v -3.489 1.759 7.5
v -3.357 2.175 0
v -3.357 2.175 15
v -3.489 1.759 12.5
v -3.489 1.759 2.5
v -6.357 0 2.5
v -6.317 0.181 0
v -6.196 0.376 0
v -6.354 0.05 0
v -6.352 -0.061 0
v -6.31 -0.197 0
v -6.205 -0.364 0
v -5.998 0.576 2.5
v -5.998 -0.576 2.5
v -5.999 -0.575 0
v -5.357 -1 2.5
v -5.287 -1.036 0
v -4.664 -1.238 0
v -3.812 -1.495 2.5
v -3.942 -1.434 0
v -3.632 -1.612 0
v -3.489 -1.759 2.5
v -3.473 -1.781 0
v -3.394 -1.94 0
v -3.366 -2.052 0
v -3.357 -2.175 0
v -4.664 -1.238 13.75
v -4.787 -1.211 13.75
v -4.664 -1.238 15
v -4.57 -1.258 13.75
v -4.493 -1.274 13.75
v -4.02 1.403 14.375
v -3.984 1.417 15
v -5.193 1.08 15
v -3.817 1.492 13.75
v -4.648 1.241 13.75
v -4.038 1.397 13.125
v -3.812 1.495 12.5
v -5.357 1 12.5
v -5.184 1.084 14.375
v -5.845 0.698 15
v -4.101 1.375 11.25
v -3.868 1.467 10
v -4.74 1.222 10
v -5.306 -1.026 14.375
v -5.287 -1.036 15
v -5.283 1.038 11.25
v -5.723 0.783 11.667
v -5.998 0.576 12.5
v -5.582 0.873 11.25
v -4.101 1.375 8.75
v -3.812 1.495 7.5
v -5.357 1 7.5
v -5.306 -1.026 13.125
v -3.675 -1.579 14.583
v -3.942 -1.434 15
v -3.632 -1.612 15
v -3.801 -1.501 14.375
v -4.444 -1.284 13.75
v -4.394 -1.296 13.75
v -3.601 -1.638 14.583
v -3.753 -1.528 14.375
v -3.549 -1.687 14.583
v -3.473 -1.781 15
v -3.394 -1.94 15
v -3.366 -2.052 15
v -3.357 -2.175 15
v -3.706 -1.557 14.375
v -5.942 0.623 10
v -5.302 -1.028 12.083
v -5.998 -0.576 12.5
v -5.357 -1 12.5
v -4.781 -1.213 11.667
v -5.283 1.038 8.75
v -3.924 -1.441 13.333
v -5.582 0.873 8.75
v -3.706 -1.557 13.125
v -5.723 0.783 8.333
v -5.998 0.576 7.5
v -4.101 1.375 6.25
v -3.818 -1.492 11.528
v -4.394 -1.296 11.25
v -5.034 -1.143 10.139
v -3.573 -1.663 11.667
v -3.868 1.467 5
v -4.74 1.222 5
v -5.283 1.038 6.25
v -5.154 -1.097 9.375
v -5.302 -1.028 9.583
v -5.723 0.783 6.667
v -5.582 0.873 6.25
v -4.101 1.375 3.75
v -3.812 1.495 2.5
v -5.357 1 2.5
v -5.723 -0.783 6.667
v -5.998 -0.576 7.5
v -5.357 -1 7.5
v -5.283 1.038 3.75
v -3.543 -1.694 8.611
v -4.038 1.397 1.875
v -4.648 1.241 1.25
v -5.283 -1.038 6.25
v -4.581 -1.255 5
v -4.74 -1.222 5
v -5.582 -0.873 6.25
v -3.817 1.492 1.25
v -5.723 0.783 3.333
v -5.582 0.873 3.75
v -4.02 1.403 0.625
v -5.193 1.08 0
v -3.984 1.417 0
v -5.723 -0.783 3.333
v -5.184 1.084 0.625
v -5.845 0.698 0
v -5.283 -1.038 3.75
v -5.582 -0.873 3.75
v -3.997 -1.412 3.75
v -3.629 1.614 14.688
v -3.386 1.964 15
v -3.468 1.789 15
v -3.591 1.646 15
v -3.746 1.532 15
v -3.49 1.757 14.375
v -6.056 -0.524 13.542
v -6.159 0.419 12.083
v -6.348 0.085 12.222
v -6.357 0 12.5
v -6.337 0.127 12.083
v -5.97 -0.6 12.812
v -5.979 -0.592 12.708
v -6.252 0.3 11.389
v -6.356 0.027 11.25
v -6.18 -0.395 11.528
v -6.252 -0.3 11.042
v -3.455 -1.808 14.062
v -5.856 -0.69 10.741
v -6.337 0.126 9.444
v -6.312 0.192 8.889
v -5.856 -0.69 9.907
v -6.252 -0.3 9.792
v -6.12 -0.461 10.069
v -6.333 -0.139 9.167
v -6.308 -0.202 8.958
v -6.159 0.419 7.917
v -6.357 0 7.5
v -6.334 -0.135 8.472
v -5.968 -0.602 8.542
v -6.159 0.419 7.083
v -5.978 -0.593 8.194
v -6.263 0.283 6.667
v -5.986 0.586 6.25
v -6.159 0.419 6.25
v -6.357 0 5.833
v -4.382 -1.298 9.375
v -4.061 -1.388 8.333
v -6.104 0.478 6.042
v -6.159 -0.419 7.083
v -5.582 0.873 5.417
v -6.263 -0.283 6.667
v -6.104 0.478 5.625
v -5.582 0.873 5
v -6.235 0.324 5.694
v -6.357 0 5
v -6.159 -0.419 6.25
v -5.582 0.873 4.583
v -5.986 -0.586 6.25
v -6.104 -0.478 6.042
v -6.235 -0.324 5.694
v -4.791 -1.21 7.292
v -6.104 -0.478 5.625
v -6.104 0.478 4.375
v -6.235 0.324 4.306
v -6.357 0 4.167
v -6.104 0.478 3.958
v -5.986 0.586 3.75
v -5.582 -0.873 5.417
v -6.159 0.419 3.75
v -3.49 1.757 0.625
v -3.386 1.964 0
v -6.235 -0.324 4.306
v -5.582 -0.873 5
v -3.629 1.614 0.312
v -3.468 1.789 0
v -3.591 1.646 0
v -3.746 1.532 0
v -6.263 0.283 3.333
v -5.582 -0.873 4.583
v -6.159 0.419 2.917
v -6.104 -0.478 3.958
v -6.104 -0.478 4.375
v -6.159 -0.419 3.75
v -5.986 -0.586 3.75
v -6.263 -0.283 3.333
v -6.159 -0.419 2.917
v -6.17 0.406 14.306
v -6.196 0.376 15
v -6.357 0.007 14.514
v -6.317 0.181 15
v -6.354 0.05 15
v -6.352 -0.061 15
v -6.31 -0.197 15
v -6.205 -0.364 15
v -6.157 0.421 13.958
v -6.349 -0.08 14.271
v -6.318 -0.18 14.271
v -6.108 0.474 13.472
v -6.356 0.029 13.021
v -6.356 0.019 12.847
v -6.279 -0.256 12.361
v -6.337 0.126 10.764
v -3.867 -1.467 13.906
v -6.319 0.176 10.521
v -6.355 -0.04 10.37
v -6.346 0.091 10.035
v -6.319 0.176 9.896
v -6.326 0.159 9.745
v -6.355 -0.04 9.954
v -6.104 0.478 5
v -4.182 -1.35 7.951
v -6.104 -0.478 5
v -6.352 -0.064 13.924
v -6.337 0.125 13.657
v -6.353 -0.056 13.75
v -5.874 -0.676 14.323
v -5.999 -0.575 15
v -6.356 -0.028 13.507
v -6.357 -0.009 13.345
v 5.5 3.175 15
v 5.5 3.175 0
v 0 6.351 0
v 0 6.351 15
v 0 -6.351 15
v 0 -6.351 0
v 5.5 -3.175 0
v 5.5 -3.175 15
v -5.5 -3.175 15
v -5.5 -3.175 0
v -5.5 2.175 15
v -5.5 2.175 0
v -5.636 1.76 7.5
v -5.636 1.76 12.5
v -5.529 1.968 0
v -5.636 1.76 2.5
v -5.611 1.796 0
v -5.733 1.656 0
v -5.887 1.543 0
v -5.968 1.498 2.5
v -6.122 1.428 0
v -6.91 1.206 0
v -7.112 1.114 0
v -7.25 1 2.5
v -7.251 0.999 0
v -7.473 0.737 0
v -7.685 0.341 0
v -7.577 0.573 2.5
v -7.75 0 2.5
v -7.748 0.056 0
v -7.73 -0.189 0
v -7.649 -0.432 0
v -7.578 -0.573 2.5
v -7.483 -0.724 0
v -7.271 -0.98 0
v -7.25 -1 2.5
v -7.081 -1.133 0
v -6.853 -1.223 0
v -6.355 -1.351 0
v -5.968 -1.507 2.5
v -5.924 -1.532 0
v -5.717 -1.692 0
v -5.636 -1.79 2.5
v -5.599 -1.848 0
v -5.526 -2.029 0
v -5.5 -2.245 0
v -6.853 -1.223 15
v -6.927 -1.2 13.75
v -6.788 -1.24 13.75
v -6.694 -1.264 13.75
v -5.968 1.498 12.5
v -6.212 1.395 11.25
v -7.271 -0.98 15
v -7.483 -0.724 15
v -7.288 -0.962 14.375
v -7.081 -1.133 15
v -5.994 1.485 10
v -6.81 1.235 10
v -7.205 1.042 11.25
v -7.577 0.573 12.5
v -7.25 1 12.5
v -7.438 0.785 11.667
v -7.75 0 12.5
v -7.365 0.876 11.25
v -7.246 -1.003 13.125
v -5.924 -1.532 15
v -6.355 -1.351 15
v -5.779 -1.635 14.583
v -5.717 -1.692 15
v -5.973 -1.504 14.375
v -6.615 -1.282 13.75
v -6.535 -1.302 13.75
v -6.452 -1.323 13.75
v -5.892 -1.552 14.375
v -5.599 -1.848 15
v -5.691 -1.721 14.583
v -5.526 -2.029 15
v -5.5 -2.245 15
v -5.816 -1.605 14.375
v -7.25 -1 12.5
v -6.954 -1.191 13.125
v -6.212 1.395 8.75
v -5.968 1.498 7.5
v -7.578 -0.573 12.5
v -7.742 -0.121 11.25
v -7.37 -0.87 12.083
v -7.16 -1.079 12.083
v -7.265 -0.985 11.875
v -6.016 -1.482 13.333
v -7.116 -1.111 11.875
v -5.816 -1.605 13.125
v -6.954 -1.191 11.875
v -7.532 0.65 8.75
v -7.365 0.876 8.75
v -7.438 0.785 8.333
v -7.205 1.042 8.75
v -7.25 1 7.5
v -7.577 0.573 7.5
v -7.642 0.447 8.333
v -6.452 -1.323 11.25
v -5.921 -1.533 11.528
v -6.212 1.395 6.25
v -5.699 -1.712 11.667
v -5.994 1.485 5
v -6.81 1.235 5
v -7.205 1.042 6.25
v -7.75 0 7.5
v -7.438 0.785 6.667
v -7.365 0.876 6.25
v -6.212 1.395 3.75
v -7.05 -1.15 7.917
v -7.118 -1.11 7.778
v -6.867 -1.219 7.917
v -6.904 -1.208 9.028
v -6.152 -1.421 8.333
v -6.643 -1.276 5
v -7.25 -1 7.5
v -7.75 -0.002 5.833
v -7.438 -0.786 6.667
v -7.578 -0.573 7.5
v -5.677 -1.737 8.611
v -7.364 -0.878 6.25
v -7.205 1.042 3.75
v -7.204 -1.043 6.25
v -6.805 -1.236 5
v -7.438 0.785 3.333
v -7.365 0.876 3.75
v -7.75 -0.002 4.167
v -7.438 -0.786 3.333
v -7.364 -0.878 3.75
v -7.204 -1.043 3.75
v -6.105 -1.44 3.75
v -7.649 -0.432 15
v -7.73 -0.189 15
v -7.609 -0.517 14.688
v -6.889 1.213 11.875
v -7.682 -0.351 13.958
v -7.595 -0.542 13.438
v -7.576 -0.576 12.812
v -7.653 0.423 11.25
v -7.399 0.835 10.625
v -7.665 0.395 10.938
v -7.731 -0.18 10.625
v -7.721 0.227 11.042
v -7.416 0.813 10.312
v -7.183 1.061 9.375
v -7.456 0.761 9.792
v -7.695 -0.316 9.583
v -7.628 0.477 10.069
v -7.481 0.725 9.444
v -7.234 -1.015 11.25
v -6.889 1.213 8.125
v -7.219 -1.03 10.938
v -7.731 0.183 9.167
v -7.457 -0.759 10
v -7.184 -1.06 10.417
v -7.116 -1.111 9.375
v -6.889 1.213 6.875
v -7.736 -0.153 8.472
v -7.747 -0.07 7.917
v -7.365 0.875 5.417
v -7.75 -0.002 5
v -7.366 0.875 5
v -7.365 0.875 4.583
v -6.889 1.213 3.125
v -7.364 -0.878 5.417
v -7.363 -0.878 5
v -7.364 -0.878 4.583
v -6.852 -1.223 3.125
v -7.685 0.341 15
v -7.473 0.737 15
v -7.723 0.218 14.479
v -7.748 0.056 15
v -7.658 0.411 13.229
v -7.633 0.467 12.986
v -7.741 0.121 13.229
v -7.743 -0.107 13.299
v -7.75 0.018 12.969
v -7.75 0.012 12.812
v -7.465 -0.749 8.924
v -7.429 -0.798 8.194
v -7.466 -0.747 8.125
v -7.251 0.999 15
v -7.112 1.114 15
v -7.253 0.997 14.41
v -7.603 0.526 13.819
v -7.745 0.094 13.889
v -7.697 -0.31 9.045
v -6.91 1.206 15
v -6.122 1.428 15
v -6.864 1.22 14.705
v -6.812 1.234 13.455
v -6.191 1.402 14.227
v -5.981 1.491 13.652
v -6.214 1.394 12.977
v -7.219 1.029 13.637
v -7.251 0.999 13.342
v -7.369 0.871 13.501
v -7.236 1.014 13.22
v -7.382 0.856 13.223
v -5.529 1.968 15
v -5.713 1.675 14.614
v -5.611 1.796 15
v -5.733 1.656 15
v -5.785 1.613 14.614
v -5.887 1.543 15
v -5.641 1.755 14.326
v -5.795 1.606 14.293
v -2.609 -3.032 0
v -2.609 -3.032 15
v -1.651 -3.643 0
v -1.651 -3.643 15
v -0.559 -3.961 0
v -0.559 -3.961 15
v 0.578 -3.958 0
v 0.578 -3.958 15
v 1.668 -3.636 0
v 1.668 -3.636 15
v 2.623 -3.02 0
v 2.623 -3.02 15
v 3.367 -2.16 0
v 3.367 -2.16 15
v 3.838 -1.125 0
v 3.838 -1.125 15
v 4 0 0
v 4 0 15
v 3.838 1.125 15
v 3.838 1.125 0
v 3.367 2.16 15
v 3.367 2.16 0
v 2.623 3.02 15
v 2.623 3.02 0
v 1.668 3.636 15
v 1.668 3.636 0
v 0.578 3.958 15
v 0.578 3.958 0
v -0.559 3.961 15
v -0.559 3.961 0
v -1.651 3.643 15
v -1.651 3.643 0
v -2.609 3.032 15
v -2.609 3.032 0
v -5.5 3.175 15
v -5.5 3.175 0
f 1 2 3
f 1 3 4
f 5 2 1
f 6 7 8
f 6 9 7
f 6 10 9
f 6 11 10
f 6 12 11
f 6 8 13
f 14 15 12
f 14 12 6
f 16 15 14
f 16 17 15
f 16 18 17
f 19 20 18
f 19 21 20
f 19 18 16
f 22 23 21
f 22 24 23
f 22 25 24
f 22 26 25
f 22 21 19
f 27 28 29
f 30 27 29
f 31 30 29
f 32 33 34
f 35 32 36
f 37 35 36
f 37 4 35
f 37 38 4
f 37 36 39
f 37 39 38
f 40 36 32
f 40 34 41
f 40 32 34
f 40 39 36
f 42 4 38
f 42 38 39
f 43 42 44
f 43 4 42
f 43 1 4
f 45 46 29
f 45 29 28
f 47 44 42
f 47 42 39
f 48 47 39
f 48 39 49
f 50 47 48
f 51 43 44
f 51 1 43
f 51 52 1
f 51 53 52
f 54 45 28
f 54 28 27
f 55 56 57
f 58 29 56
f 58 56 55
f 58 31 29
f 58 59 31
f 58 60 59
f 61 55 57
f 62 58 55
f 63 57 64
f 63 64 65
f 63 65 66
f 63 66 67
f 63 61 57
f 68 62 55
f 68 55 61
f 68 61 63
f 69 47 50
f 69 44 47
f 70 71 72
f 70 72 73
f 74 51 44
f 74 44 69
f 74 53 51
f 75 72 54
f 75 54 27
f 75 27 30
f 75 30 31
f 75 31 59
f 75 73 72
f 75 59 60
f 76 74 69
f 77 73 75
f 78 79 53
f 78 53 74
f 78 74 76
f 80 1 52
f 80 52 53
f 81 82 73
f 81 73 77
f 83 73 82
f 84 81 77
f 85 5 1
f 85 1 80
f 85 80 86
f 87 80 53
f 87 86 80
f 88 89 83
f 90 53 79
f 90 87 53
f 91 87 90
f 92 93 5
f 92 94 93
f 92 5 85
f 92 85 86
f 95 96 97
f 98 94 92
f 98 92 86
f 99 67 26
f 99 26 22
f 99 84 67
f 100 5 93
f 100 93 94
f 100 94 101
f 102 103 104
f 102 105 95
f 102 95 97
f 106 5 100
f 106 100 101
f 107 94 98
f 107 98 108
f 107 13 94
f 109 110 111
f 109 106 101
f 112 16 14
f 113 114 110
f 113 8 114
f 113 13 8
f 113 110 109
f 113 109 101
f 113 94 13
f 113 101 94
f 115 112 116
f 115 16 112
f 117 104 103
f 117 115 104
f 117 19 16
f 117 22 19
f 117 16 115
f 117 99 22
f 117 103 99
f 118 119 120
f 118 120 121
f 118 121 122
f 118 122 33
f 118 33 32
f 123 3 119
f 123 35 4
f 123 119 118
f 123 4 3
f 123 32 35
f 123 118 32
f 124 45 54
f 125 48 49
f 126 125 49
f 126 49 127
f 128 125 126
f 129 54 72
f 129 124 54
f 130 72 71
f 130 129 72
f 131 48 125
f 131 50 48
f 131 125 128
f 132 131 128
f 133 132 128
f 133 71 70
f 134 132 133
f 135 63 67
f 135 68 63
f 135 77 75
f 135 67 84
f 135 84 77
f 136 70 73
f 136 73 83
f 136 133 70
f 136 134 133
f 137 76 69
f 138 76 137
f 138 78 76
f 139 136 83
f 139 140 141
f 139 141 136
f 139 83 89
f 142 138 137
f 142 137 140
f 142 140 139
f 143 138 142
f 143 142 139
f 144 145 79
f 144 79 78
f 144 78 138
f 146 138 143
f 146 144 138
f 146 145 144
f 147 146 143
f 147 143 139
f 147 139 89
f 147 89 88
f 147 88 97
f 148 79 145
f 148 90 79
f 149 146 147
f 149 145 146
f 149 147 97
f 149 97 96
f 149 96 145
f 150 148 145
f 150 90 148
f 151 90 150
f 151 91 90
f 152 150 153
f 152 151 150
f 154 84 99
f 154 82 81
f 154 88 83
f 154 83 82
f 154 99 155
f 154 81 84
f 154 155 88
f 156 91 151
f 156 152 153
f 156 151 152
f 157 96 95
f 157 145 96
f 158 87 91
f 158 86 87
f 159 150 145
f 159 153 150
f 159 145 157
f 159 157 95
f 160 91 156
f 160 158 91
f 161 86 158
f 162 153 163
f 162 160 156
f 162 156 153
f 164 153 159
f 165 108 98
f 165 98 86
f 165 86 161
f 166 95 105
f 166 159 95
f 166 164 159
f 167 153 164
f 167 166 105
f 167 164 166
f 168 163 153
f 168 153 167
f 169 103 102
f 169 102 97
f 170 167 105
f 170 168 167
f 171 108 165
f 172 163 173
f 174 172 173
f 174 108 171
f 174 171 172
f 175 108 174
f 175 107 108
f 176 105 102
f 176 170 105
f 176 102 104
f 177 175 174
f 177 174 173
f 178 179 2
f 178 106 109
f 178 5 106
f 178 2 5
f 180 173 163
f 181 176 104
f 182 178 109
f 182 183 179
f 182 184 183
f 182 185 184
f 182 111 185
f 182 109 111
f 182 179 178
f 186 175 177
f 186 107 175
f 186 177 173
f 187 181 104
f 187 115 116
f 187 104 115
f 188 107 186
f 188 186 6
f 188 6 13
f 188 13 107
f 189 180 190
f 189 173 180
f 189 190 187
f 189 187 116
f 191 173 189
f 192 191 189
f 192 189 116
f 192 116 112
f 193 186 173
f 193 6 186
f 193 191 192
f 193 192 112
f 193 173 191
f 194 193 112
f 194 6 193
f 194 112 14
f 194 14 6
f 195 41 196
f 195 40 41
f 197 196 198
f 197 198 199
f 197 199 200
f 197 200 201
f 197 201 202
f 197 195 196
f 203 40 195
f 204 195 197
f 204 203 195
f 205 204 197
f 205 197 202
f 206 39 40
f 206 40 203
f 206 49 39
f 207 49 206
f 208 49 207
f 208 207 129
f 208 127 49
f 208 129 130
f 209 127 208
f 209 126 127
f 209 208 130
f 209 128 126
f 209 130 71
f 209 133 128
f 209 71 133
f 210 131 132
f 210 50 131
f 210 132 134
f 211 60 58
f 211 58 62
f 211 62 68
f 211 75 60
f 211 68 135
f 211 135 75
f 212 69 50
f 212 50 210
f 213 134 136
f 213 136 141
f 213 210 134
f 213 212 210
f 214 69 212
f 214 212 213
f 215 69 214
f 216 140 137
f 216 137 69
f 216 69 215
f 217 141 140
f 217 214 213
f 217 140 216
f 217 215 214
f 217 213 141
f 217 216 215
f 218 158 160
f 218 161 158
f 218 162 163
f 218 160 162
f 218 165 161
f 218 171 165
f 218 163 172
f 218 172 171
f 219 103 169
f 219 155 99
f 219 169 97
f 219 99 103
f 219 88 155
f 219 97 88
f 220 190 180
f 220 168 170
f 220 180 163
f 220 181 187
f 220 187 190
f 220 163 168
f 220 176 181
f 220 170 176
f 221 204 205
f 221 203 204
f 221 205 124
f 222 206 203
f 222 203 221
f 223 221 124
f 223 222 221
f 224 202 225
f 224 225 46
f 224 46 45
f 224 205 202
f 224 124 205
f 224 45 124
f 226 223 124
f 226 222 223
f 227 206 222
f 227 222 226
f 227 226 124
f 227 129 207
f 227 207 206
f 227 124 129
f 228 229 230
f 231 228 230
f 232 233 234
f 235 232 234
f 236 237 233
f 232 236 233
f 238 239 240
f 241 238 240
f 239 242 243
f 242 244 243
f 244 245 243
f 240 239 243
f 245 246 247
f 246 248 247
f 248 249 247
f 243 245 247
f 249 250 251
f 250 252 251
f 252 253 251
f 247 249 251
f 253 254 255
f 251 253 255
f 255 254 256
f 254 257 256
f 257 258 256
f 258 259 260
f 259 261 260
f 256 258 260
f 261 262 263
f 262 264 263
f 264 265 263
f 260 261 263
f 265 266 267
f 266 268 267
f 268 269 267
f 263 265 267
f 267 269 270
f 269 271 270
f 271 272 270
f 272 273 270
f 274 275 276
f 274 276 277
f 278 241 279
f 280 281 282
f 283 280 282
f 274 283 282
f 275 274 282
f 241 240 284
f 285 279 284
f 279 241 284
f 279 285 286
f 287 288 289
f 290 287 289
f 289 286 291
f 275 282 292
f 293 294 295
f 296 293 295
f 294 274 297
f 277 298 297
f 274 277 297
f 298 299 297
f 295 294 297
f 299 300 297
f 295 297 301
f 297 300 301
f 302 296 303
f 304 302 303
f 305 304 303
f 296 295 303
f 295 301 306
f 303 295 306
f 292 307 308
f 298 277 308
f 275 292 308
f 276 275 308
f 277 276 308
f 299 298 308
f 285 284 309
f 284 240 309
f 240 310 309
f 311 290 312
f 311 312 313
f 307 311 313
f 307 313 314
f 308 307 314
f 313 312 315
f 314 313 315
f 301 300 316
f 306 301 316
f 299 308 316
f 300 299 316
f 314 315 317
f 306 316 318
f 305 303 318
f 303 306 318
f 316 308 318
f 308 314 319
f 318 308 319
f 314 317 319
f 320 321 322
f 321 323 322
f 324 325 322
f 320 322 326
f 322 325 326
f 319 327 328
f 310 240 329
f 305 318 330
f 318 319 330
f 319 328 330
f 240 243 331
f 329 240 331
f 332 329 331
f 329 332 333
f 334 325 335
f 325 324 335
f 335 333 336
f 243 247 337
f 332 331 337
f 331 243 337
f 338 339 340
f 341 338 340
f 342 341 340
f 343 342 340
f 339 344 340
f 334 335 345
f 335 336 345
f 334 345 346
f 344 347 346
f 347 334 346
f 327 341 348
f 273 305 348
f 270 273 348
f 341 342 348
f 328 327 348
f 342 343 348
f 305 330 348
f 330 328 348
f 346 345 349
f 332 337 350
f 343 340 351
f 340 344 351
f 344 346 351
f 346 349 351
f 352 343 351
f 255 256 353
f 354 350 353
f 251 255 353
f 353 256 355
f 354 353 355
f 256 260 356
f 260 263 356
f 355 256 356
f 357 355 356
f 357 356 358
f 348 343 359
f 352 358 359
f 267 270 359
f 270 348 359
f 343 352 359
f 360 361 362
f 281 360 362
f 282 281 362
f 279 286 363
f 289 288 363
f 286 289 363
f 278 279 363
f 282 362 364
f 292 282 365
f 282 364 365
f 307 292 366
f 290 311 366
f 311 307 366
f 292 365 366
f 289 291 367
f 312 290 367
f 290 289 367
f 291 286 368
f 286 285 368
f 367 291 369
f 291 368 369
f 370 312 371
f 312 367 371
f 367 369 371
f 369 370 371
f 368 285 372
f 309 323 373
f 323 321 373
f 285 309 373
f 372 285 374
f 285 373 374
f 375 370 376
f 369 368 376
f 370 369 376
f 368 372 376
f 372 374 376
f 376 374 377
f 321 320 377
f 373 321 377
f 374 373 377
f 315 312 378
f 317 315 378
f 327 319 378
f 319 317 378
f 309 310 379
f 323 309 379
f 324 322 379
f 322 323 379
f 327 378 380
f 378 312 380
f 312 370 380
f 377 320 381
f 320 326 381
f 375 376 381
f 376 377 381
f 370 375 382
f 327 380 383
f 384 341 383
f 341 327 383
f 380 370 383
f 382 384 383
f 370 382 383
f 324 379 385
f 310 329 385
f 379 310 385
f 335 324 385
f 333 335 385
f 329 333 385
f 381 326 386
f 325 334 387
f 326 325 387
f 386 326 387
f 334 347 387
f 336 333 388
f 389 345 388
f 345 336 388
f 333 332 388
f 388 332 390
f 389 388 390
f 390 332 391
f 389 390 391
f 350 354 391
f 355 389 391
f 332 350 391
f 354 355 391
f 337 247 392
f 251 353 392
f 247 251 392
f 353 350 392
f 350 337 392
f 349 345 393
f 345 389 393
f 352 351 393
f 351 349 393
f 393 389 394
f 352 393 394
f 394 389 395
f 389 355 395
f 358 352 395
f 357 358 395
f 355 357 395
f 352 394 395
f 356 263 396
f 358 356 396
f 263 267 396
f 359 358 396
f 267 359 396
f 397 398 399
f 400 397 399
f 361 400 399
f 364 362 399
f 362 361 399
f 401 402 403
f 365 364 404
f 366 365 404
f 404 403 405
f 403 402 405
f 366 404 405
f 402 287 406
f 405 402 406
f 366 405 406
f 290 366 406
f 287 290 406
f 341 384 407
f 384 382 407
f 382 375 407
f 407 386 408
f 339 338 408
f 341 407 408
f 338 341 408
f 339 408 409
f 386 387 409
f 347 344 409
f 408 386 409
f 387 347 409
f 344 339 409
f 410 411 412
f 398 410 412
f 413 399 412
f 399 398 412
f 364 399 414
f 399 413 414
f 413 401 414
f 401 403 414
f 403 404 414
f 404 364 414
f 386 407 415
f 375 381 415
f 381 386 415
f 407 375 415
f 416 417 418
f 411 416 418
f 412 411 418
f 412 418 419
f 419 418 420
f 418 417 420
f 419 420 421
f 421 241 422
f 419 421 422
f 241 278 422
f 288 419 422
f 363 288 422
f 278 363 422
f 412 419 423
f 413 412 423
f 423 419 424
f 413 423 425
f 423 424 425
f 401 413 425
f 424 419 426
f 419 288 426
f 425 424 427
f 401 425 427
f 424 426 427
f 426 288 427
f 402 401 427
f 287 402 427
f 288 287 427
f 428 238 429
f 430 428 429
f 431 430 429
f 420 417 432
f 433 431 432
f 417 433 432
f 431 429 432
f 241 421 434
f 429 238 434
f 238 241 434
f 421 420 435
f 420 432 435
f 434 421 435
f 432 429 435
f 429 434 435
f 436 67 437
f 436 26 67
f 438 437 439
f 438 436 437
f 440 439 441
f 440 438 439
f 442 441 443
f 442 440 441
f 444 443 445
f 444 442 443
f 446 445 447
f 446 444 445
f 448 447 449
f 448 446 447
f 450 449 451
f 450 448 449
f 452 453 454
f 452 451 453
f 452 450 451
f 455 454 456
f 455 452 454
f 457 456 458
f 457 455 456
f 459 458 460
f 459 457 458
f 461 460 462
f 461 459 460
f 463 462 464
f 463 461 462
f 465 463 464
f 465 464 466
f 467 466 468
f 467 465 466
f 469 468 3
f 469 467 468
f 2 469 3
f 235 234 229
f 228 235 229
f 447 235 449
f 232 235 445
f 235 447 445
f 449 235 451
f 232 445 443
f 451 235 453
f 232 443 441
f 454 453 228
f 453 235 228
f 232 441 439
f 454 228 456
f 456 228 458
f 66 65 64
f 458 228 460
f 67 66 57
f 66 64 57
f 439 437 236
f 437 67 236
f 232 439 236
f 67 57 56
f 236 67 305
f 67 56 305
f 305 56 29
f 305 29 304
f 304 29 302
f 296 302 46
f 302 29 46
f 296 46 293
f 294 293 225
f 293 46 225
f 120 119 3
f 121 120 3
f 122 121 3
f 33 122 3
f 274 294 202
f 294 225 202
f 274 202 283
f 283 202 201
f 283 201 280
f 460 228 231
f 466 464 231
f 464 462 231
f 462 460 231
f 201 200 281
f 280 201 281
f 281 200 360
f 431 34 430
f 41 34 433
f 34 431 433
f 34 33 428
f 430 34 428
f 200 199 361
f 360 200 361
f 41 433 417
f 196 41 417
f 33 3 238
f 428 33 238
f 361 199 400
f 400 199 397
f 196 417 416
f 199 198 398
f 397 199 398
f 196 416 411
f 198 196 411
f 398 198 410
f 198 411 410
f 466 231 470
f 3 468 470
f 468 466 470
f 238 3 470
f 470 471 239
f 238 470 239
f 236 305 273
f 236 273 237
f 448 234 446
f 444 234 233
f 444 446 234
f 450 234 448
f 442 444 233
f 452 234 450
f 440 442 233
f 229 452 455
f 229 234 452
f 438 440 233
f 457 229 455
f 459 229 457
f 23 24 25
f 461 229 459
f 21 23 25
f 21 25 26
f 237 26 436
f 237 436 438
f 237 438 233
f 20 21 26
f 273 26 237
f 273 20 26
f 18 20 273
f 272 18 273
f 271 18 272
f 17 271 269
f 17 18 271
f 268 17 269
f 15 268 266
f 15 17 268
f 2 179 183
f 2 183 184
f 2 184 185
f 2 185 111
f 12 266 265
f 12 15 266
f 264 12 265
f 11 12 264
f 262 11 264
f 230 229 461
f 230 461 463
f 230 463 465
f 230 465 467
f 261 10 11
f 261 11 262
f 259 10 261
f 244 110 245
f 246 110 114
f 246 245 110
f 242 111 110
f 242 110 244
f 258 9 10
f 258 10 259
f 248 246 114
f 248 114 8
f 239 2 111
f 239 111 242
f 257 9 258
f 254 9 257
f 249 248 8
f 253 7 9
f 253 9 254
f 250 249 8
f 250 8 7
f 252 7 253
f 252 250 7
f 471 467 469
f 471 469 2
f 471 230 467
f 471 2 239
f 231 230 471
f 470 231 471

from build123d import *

# Parameters (mm, degrees)
F0_R       = 4
F1_DEPTH   = 15
F1_FACE1_R = 4
F3_DEPTH   = 15.001
F5_DEPTH   = 15


# Not quite as in the source:
# - a feature of the source that left no trace in its solid (it failed there, or was rolled back) is left out


with BuildPart() as f1:
    # F0 (on Top) → F1 (new body)
    with BuildSketch(Plane.XY):
        Polygon((5.5, -3.1754264805), (5.5, 3.1754264805), (0, 6.3508529611), (-5.5, 3.1754264805), (-5.5, -3.1754264805), (0, -6.3508529611), align=None)
        Circle(F0_R, mode=Mode.SUBTRACT)
    extrude(amount=F1_DEPTH)

    # F2 (on face) + F1_face1 (on face) → F3 (cut, through all)
    with BuildSketch(Plane.XY.offset(15)):
        with BuildLine():
            Line((-3.3567126222, 2.1754264805), (-5.5, 2.1754264805))
            Line((-5.5, 2.1754264805), (-5.5, -2.1754264805))
            Line((-5.5, -2.1754264805), (-3.3567126222, -2.1754264805))
            ThreePointArc((-3.3567126222, -2.1754264805), (-4, 0), (-3.3567126222, 2.1754264805))
        make_face()
    with BuildSketch(Plane(origin=(0, 0, 0), x_dir=(1, 0, 0), z_dir=(0, 0, -1))):
        Polygon((5.5, -3.1754264805), (5.5, 3.1754264805), (0, 6.3508529611), (-5.5, 3.1754264805), (-5.5, -3.1754264805), (0, -6.3508529611), align=None)
        Circle(F1_FACE1_R, mode=Mode.SUBTRACT)
    extrude(amount=-F3_DEPTH, dir=(0, 0, 1), mode=Mode.SUBTRACT)

    # F4 (on Top) → F5 (join, through all)
    with BuildSketch(Plane.XY):
        with BuildLine():
            add(Edge.make_bspline(
                [(-3.3567126222, 2.1754264805), (-3.3567126222, 1.5), (-4.7243783011, 1.2322496152), (-5.2691254391, 1.1014623302), (-6.9790180063, 0), (-5.2691254391, -1.1014623302), (-4.7243783011, -1.2322496152), (-3.3567126222, -1.5), (-3.3567126222, -2.1754264805)],
                knots=[0, 0, 0, 0, 0.1875096718, 0.3211964826, 0.5, 0.6788035174, 0.8124903282, 1, 1, 1, 1], degree=3))
            Line((-3.3567126222, 2.1754264805), (-5.5, 2.1754264805))
            add(Edge.make_bspline(
                [(-5.5, 2.1754264805), (-5.5, 1.5), (-6.8295402039, 1.2640494778), (-7.2493526274, 1.0792890587), (-8.0427649595, -0.000100502), (-7.2510852775, -1.0789459234), (-6.8212907124, -1.2661384452), (-5.5, -1.5), (-5.5, -2.2451365801)],
                knots=[0, 0, 0, 0, 0.2037356069, 0.3258802228, 0.4986187951, 0.6713573674, 0.7935019833, 1, 1, 1, 1], degree=3))
            Line((-5.5, -2.2451365801), (-3.3567126222, -2.1754264805))
        make_face()
    extrude(amount=F5_DEPTH)


solid = f1.part
